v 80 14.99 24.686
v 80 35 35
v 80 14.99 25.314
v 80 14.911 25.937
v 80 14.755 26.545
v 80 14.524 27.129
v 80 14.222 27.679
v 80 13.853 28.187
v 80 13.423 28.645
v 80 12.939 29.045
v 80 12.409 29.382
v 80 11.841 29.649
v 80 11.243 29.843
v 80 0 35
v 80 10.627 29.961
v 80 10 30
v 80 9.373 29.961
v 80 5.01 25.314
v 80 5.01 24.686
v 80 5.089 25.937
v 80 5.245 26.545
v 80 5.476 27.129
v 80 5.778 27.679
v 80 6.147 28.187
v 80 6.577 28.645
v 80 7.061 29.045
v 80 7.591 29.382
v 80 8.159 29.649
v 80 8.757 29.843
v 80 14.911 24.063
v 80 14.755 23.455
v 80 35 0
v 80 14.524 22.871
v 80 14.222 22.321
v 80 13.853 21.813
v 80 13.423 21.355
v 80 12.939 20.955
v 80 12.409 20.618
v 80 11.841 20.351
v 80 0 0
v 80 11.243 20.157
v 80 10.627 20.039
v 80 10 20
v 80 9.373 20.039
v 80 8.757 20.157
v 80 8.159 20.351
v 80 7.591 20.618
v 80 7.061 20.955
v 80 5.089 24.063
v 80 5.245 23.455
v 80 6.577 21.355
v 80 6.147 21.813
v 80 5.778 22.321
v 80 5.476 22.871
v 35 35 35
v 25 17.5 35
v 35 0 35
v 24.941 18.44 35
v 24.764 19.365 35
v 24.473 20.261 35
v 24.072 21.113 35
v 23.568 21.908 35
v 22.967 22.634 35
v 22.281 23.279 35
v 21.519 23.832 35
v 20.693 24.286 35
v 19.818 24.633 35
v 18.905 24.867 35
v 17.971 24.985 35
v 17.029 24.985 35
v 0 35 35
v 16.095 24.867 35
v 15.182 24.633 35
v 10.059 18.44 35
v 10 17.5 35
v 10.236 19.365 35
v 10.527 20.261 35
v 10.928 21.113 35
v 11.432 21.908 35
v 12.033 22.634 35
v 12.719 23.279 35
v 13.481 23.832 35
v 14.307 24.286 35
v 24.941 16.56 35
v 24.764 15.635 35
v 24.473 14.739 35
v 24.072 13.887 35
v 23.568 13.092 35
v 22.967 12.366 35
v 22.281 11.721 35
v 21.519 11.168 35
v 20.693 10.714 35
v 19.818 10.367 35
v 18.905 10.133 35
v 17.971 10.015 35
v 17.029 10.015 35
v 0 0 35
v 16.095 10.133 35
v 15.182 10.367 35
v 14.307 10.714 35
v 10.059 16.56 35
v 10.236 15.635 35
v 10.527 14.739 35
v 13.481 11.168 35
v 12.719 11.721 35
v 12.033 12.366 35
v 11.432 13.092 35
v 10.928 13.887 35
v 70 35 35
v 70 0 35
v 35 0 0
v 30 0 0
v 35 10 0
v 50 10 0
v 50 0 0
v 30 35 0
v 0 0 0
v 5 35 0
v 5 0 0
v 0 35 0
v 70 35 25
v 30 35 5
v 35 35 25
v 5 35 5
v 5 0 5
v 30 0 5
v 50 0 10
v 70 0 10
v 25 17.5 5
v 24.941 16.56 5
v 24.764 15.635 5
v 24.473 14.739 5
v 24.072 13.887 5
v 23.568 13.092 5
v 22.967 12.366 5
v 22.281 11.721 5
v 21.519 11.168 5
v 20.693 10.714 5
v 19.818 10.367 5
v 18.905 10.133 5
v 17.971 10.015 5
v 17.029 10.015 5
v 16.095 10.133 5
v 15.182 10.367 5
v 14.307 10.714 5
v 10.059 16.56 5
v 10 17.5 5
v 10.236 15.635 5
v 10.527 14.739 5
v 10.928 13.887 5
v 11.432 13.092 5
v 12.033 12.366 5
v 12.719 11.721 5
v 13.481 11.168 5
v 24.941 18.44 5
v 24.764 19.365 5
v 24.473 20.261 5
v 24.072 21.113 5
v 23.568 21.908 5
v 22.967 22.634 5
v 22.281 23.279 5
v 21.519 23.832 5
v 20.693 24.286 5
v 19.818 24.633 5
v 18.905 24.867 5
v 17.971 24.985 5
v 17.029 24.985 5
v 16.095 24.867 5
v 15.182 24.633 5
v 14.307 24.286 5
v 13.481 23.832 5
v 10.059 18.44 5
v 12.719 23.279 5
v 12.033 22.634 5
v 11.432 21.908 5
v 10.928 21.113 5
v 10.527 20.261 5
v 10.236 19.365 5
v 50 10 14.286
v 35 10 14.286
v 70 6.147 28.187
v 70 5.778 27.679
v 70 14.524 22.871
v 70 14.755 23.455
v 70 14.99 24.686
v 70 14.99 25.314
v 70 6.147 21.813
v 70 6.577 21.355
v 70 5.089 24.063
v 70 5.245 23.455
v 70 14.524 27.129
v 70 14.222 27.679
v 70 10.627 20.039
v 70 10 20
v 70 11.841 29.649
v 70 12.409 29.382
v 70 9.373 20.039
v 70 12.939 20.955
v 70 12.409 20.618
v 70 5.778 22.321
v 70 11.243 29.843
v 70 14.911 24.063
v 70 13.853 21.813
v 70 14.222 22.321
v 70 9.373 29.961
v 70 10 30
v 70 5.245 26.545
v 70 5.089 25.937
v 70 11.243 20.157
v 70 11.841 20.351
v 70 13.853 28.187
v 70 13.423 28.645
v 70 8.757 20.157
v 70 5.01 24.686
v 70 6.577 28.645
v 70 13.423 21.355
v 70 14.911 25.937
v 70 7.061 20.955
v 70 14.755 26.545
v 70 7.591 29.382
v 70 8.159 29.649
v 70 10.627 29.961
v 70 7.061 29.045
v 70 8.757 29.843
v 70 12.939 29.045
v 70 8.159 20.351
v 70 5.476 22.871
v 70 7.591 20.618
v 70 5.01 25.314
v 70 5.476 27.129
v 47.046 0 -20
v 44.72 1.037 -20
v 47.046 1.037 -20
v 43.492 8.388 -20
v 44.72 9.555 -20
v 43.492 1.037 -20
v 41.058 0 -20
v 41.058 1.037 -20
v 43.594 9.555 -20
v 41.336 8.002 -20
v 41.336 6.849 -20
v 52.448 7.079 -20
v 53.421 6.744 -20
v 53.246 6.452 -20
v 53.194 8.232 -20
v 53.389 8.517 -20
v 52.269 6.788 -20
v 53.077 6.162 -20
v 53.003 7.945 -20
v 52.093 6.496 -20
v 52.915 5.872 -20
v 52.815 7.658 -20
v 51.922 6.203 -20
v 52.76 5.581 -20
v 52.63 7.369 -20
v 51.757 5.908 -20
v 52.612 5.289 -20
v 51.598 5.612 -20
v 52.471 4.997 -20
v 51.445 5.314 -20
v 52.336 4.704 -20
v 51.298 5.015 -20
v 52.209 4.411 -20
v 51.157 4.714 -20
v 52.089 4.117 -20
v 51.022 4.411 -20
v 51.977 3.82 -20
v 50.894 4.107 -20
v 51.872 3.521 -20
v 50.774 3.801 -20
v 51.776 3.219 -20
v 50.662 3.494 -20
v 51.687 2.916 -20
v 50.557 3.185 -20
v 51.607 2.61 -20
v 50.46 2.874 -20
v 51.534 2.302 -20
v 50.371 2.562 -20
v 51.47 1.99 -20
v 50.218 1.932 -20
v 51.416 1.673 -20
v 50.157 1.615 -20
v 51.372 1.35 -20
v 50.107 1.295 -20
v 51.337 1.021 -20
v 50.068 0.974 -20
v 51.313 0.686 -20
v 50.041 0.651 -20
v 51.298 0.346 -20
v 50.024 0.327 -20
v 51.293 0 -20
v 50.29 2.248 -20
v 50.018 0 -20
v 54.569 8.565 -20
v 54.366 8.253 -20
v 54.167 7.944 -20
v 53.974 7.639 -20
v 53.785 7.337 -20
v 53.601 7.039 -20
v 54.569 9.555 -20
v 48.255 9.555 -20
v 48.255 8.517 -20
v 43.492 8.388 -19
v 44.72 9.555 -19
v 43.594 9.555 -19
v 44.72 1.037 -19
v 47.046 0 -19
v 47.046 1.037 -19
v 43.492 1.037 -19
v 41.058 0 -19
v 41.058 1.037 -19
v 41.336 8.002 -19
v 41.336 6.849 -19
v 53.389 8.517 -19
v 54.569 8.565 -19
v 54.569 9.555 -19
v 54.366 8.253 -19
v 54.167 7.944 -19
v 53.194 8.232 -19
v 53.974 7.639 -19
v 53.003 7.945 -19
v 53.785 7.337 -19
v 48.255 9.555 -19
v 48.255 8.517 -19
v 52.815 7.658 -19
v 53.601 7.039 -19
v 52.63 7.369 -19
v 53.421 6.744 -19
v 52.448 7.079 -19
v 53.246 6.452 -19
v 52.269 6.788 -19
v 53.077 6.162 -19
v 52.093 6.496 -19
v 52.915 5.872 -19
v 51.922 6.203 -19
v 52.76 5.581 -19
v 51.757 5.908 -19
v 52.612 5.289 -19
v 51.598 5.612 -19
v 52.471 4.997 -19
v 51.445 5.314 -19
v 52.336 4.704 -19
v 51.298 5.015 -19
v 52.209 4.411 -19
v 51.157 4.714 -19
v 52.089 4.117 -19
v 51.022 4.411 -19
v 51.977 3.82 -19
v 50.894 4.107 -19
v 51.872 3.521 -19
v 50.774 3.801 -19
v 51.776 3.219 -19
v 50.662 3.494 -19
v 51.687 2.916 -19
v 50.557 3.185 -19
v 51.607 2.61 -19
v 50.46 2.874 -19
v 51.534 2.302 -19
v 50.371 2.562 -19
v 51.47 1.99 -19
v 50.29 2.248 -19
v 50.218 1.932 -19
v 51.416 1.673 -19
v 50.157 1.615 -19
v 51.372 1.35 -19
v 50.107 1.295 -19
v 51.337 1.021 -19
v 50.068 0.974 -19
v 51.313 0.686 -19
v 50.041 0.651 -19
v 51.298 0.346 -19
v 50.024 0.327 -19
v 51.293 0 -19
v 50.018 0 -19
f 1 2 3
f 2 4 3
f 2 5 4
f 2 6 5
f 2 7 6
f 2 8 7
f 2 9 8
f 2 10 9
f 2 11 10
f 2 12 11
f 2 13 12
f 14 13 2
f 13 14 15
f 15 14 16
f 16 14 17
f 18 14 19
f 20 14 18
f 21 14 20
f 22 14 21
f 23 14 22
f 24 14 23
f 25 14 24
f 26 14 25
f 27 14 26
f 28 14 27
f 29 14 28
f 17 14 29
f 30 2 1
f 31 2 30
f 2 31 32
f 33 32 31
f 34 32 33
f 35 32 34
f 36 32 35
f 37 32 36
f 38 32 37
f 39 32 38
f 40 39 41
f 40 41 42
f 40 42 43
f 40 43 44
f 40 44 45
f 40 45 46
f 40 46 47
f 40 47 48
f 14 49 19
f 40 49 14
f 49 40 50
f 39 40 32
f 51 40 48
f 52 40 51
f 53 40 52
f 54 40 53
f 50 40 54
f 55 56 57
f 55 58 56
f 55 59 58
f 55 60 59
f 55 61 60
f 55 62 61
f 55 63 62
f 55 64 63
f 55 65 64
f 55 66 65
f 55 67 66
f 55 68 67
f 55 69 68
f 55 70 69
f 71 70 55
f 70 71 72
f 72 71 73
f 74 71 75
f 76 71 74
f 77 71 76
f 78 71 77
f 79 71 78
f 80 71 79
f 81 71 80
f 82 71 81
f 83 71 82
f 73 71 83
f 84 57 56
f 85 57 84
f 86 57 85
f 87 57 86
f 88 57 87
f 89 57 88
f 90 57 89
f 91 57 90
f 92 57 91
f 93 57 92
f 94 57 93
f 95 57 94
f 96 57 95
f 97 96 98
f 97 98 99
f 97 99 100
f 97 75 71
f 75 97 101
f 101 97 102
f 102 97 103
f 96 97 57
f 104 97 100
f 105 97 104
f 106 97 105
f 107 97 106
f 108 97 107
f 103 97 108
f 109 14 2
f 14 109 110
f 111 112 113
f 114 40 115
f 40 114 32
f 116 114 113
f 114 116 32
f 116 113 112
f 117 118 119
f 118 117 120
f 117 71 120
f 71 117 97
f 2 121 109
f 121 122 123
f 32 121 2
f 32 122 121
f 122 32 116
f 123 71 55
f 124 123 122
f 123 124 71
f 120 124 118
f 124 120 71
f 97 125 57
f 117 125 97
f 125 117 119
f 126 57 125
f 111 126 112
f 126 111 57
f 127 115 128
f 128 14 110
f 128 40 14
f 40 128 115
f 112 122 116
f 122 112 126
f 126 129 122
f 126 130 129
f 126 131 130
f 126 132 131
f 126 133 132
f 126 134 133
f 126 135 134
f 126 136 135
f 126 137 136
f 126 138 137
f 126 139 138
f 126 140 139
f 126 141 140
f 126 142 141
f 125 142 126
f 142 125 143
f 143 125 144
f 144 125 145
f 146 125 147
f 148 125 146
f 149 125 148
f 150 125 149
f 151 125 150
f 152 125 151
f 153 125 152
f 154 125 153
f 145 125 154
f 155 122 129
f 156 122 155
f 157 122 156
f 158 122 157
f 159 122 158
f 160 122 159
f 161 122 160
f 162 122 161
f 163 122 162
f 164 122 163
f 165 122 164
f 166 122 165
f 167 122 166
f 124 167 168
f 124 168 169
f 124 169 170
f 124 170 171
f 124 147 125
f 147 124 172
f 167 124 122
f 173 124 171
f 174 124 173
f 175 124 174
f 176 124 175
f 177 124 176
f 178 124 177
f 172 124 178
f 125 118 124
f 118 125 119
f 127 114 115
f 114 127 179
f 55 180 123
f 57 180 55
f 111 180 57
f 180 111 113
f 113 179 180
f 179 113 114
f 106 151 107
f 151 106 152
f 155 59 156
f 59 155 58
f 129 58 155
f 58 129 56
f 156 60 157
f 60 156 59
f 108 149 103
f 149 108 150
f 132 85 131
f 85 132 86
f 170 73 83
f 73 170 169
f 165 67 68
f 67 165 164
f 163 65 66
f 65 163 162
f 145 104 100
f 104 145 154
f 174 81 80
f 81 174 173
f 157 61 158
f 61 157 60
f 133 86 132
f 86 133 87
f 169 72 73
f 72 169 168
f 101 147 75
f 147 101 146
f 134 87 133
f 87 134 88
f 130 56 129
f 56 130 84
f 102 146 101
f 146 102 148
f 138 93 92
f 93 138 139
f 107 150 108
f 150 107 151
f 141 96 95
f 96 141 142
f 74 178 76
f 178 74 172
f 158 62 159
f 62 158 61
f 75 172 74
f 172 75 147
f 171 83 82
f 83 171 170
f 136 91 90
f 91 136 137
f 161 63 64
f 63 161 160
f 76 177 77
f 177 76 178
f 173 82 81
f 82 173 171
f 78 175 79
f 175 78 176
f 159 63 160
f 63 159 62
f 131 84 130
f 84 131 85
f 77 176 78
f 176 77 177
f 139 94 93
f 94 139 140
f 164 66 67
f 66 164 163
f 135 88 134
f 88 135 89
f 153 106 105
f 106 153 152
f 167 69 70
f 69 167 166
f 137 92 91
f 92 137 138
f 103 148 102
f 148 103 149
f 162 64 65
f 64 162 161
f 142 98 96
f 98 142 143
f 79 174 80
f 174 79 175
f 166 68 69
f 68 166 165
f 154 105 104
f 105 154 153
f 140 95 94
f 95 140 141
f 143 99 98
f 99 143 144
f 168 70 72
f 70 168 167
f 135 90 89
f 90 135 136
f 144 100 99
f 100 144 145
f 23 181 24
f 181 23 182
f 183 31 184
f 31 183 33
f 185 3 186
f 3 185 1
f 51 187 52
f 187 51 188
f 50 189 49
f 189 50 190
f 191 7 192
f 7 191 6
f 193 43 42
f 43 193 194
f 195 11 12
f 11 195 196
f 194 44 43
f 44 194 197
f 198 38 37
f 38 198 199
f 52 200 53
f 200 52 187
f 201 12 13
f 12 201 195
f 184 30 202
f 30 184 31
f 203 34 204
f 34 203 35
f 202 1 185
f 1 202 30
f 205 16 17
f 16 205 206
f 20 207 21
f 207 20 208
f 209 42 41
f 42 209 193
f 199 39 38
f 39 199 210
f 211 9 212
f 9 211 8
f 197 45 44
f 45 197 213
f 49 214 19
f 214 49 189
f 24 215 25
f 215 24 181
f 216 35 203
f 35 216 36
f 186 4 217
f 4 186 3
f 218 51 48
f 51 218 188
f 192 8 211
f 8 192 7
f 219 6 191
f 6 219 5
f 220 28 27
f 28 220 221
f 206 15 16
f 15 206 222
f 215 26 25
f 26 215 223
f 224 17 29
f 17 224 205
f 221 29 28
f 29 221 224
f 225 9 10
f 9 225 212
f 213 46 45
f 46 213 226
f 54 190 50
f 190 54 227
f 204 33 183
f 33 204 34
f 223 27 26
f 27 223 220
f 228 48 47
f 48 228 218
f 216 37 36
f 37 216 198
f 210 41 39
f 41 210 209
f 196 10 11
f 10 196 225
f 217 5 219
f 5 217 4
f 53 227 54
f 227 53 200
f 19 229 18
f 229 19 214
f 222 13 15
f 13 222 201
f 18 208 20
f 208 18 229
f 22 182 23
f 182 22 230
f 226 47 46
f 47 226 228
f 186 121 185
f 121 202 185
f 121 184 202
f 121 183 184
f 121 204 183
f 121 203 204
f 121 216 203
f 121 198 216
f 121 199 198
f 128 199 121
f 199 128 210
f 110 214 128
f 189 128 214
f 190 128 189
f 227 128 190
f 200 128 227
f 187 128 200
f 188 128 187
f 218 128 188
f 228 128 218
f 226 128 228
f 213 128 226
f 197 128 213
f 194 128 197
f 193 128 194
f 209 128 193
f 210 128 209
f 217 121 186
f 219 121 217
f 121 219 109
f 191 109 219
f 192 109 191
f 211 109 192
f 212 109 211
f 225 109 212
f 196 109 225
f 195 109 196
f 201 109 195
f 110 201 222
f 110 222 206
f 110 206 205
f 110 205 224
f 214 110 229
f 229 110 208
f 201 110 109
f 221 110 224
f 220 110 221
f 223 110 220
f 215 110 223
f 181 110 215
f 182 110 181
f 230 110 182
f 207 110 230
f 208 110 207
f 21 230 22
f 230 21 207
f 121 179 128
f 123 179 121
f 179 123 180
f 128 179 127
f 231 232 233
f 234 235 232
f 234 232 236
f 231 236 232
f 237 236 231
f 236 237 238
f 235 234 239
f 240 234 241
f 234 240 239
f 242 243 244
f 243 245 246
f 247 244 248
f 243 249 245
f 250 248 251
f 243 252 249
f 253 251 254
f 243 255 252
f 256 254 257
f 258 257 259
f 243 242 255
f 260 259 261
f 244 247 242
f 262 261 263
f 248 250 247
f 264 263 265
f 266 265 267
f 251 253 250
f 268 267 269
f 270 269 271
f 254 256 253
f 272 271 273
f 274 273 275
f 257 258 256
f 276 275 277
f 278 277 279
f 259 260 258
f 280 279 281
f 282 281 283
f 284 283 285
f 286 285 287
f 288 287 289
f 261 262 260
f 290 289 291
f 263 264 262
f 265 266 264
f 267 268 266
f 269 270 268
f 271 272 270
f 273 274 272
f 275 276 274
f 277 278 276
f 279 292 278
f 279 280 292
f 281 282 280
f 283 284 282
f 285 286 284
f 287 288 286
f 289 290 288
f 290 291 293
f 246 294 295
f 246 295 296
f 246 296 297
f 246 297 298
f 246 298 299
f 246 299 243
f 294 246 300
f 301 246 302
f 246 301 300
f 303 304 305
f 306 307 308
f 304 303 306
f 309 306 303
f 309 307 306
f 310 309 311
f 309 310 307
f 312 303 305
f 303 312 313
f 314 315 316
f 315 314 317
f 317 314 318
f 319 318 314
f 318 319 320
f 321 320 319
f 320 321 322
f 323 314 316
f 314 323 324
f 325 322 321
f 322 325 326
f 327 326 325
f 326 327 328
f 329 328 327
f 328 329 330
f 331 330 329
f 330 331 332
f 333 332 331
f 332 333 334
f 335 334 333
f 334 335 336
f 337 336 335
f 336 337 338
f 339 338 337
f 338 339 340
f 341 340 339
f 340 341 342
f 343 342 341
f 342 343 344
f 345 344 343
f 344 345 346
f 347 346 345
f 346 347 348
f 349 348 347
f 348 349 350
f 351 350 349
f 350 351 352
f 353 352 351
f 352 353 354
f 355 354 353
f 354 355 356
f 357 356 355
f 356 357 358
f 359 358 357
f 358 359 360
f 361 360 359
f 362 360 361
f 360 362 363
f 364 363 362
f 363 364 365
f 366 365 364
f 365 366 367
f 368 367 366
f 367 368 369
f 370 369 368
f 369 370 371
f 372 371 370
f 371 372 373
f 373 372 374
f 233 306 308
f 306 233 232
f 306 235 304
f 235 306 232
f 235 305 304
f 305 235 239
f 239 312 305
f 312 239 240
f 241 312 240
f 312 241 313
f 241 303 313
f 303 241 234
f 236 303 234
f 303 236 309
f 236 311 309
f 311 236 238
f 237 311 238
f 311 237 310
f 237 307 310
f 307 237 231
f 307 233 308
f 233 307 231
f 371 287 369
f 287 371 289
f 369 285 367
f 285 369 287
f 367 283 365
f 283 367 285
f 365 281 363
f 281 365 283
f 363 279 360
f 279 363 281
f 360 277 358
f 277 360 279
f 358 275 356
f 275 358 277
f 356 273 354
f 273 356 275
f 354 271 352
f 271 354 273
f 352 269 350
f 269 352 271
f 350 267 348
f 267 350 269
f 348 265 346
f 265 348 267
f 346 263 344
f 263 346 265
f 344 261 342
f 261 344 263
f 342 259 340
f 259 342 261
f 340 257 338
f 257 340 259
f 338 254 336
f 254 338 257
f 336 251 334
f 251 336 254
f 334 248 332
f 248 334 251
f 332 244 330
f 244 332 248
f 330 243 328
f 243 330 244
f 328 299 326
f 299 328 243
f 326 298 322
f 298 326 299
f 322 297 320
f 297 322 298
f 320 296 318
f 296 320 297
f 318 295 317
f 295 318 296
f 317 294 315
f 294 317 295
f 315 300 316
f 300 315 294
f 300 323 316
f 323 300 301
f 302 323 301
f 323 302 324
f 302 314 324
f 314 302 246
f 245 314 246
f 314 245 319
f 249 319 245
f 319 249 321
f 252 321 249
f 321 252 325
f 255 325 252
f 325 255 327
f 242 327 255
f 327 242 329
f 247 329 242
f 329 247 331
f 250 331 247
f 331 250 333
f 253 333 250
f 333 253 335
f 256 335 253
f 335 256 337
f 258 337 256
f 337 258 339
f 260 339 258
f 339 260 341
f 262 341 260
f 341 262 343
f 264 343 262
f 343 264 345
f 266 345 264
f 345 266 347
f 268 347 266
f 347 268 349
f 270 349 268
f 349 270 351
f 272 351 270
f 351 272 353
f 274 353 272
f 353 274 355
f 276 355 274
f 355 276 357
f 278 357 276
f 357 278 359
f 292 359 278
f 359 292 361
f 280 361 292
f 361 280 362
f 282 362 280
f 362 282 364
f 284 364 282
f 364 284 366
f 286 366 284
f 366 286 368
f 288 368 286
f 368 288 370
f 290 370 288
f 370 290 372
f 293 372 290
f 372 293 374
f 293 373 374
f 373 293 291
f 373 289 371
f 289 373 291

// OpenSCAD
$fn=50;

cw=80;
cd=35;
ch=35;
cy=10;
zhh=25;
zhl=10;

difference() {
    cube([cw,cd,ch]);
    translate([5,0,0])
    cube([25,cd,5]);
    translate([35,0,0])
    cube([15,10,ch]);
    translate([35/2,35/2,0])
    cylinder(h=ch,d=15);
    translate([cw-10,10,ch-10])
    rotate([0,90,0])
    cylinder(h=10,d=10);
    polyhedron(
        points=[ [35,0,zhl],     //0
                 [35,0,ch],     //1
                 [70,0,zhl],     //2
                 [70,0,ch],     //3
                 [70,cd,zhh],    //4
                 [70,cd,ch],    //5
                 [35,cd,ch],    //6
                 [35,cd,zhh]     //7
                 ],
        faces=[  [0,1,2],
                 [3,2,1],
                 [2,3,4],
                 [3,5,4],
                 [7,1,0],
                 [7,6,1],
                 [5,3,1],
                 [6,5,1],
                 [4,5,6],
                 [7,4,6],
                 [0,2,7],
                 [2,4,7]
                 ]);
}


translate([cw/2,0,-20])
linear_extrude(height=1)
text("17");
